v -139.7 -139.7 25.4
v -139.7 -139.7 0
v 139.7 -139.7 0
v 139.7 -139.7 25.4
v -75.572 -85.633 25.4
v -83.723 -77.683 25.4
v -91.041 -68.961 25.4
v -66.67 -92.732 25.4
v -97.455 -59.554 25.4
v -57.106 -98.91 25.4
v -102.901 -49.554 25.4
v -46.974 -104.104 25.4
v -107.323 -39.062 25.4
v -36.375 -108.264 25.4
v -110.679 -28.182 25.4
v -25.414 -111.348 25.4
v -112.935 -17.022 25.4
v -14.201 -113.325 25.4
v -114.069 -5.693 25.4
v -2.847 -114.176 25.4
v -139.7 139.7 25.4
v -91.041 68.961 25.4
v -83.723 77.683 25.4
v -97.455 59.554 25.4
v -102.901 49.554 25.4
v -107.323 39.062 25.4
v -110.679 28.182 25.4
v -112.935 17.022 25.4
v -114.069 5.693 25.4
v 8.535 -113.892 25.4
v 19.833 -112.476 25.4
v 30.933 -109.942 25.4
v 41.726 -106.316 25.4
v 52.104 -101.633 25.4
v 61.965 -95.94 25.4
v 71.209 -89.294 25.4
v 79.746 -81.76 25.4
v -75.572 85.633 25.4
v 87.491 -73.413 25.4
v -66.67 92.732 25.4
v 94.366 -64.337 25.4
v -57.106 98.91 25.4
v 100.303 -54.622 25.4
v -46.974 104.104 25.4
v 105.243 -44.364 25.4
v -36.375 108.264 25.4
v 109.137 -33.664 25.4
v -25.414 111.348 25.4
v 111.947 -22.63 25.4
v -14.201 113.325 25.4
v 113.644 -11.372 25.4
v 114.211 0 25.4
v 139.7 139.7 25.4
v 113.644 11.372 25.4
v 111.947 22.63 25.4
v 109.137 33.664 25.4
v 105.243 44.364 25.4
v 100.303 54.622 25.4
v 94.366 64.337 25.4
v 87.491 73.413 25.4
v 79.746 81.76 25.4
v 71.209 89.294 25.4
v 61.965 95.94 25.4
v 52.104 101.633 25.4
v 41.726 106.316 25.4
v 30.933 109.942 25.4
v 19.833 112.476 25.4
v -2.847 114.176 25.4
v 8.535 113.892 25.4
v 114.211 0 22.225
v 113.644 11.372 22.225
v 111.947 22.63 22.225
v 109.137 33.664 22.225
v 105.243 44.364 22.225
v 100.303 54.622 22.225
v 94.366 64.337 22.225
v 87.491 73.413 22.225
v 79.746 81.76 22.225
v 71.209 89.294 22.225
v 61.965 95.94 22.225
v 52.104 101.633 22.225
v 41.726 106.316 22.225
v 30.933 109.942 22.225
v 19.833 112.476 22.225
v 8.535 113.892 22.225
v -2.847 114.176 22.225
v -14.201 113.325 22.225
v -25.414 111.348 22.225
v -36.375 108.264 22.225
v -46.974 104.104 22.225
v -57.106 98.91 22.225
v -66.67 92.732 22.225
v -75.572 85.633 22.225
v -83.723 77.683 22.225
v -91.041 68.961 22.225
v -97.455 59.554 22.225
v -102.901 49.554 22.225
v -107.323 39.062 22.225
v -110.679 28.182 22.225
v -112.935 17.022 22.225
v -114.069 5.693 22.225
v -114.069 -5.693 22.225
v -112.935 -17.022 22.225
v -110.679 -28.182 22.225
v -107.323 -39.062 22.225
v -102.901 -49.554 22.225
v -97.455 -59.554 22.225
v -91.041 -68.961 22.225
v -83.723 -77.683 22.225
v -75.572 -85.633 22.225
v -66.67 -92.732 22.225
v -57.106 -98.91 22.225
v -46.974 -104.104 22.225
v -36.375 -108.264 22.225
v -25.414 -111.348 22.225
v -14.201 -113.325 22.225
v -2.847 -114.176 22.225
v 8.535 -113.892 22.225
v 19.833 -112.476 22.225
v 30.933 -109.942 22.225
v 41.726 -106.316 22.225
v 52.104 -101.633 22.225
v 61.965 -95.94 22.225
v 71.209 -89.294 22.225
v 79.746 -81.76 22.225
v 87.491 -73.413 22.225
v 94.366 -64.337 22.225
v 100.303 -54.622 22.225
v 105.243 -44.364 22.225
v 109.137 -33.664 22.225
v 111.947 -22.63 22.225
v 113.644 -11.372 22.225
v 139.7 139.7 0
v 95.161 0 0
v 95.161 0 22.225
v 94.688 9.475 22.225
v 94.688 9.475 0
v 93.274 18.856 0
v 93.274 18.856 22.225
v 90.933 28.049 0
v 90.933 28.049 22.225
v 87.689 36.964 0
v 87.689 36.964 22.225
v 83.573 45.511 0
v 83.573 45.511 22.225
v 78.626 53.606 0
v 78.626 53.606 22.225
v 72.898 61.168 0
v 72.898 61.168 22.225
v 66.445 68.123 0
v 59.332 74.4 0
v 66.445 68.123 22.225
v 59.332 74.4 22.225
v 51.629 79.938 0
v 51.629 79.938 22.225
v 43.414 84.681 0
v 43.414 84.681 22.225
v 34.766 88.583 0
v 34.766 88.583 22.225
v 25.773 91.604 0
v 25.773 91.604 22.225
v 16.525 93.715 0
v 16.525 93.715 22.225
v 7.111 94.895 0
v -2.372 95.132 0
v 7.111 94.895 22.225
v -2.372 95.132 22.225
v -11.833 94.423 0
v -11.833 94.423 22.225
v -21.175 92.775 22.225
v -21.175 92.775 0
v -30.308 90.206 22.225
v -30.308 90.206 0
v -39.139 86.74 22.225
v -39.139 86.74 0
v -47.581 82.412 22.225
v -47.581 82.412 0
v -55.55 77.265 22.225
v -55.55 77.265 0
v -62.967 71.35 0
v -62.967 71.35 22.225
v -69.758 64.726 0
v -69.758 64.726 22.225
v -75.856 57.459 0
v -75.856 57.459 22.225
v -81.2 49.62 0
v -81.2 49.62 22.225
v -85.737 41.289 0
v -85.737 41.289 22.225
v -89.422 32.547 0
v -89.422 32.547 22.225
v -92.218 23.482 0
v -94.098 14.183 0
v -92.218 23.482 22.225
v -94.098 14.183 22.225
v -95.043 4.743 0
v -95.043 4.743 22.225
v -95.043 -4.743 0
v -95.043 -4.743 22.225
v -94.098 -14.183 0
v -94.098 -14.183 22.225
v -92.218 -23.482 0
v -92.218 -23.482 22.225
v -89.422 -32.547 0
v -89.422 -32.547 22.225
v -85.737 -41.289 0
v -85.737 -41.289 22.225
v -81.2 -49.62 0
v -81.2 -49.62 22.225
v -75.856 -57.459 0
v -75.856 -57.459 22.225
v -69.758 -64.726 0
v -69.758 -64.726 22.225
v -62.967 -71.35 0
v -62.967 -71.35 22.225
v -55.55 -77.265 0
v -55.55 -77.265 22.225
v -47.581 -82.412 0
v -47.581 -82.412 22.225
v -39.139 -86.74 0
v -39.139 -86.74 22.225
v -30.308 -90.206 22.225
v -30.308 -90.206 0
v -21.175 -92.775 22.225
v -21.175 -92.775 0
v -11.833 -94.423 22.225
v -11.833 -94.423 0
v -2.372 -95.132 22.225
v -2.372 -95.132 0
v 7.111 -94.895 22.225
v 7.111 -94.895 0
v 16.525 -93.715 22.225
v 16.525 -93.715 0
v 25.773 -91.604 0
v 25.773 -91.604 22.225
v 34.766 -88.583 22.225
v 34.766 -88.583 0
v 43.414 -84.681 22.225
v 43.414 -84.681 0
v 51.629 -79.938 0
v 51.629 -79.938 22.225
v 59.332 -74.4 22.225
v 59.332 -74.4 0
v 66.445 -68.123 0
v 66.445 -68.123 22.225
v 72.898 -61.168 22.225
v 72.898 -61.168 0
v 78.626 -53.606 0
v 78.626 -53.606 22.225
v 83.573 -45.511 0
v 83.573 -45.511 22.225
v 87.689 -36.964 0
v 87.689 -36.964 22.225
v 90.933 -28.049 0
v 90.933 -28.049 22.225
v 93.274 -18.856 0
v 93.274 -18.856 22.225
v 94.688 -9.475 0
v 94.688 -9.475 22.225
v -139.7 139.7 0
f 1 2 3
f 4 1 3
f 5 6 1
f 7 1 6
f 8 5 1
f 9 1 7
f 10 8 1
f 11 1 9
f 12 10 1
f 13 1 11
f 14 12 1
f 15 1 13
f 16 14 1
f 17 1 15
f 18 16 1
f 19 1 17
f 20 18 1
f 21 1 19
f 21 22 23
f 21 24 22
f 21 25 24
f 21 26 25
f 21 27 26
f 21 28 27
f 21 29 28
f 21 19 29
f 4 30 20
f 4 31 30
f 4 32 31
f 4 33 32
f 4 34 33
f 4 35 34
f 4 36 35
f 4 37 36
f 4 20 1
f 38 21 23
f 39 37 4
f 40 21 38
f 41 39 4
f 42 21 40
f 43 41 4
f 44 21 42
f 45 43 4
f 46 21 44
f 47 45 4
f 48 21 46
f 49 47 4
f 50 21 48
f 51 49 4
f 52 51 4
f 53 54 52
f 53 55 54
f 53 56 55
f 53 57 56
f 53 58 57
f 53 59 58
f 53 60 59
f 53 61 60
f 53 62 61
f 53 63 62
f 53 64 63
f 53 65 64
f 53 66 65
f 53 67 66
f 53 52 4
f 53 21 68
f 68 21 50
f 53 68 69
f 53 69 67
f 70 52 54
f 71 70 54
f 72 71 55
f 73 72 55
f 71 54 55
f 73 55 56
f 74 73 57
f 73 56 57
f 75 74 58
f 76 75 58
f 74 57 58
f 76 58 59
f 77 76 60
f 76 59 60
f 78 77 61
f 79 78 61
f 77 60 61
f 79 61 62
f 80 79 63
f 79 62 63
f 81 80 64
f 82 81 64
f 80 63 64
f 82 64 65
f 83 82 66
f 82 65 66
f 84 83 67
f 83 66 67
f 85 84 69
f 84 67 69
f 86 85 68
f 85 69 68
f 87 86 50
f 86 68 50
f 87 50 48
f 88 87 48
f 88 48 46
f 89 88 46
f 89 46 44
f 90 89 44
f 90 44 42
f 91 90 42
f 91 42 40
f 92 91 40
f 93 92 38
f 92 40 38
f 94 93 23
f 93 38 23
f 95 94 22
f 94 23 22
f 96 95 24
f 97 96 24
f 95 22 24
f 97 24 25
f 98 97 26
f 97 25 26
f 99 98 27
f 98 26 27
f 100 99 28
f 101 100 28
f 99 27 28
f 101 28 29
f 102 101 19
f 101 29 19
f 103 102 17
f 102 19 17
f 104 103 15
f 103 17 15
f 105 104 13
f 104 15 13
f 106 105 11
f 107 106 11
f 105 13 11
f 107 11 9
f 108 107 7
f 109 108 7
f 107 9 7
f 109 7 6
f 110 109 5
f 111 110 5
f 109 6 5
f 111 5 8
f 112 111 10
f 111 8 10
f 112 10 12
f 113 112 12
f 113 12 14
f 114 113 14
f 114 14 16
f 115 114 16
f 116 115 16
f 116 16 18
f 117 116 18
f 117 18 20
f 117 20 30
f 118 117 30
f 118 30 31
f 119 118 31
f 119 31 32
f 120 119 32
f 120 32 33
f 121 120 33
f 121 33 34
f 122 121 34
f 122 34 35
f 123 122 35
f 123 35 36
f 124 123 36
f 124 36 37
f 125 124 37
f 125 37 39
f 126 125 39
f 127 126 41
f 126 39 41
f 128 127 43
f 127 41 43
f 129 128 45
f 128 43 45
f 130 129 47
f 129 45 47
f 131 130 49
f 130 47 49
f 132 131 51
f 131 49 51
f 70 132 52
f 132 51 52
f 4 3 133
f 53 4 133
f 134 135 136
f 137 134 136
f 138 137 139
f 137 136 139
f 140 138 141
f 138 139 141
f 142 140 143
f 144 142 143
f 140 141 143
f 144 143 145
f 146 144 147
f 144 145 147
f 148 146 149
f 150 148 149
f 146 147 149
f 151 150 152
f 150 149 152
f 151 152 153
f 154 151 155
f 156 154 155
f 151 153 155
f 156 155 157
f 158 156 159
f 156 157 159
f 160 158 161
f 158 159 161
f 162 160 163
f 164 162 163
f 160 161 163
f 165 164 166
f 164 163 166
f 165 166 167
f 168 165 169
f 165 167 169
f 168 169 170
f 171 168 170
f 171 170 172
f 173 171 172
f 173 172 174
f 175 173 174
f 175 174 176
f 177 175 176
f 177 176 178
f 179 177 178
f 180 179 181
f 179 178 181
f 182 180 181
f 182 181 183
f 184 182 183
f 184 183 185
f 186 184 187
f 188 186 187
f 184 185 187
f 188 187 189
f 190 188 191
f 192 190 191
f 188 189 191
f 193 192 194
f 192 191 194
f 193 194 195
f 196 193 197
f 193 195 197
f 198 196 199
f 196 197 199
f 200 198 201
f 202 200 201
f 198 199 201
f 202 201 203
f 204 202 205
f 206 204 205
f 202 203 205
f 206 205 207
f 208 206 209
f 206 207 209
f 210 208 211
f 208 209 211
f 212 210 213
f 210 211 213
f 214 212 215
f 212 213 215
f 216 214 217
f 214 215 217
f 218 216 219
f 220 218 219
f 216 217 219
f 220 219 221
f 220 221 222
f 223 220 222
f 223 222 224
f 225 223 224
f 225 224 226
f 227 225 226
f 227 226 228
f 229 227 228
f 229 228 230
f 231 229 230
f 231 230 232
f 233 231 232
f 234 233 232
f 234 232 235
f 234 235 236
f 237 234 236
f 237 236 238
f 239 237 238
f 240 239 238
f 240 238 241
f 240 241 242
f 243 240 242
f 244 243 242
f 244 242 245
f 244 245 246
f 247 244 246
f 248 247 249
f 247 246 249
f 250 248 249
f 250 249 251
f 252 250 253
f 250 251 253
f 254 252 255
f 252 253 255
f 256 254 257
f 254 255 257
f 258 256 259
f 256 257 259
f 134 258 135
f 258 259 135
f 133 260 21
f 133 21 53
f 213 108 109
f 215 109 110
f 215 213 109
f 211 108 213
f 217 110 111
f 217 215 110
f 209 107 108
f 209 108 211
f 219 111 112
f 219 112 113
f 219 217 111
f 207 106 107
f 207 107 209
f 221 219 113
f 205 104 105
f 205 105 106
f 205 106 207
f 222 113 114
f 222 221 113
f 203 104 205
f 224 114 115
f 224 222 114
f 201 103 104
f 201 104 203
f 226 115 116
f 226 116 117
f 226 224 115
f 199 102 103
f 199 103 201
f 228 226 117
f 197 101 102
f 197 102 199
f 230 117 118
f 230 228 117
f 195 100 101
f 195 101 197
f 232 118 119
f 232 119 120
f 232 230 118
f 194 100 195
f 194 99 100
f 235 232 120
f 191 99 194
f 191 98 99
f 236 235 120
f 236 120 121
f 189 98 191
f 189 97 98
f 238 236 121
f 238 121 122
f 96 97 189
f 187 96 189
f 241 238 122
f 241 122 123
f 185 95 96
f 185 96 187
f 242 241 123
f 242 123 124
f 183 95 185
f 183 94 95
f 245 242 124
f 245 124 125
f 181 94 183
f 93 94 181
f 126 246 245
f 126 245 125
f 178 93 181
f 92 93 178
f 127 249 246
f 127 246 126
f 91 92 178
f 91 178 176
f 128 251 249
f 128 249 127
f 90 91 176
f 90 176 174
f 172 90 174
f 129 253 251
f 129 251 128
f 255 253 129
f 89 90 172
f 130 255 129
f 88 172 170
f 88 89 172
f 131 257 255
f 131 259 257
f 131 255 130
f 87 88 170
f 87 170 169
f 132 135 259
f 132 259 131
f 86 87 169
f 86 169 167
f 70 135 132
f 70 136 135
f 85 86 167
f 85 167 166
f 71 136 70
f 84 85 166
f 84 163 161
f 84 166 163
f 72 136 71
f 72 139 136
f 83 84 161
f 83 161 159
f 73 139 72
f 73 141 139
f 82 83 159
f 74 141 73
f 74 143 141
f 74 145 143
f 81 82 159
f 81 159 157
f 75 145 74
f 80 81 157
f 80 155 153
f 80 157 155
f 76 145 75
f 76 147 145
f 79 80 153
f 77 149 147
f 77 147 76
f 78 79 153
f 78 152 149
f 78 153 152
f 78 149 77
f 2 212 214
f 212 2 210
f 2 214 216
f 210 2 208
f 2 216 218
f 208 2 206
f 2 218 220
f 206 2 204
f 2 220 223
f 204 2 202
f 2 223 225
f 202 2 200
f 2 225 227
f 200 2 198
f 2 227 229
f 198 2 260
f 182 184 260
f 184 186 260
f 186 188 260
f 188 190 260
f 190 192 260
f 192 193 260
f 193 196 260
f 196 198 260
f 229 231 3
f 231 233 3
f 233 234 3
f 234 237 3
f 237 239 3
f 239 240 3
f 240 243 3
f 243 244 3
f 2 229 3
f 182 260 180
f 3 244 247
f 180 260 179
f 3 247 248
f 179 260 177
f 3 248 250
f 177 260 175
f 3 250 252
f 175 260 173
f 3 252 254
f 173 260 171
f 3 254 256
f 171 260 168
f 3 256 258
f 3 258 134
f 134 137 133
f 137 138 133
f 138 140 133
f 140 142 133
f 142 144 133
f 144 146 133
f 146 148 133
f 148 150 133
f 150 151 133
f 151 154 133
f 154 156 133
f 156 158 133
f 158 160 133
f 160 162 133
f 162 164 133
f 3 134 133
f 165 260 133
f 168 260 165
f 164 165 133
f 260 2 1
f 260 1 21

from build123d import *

# Parameters (mm, degrees)
F0_W     = 279.4
F0_H     = 279.4
F1_DEPTH = 25.4
F2_R     = 114.2111
F3_DEPTH = 3.175
F4_R     = 95.1611
F5_DEPTH = 22.225


# Not quite as in the source:
# - a feature of the source that left no trace in its solid (it failed there, or was rolled back) is left out


with BuildPart() as f1:
    # F0 (on Top) → F1 (new body)
    with BuildSketch(Plane.XY):
        Rectangle(F0_W, F0_H)
    extrude(amount=F1_DEPTH)

    # F2 (on face) → F3 (cut)
    with BuildSketch(Plane.XY.offset(25.4)):
        Circle(F2_R)
    extrude(amount=-F3_DEPTH, mode=Mode.SUBTRACT)

    # F4 (on face) → F5 (cut)
    with BuildSketch(Plane.XY.offset(22.225)):
        Circle(F4_R)
    extrude(amount=-F5_DEPTH, mode=Mode.SUBTRACT)


solid = f1.part
